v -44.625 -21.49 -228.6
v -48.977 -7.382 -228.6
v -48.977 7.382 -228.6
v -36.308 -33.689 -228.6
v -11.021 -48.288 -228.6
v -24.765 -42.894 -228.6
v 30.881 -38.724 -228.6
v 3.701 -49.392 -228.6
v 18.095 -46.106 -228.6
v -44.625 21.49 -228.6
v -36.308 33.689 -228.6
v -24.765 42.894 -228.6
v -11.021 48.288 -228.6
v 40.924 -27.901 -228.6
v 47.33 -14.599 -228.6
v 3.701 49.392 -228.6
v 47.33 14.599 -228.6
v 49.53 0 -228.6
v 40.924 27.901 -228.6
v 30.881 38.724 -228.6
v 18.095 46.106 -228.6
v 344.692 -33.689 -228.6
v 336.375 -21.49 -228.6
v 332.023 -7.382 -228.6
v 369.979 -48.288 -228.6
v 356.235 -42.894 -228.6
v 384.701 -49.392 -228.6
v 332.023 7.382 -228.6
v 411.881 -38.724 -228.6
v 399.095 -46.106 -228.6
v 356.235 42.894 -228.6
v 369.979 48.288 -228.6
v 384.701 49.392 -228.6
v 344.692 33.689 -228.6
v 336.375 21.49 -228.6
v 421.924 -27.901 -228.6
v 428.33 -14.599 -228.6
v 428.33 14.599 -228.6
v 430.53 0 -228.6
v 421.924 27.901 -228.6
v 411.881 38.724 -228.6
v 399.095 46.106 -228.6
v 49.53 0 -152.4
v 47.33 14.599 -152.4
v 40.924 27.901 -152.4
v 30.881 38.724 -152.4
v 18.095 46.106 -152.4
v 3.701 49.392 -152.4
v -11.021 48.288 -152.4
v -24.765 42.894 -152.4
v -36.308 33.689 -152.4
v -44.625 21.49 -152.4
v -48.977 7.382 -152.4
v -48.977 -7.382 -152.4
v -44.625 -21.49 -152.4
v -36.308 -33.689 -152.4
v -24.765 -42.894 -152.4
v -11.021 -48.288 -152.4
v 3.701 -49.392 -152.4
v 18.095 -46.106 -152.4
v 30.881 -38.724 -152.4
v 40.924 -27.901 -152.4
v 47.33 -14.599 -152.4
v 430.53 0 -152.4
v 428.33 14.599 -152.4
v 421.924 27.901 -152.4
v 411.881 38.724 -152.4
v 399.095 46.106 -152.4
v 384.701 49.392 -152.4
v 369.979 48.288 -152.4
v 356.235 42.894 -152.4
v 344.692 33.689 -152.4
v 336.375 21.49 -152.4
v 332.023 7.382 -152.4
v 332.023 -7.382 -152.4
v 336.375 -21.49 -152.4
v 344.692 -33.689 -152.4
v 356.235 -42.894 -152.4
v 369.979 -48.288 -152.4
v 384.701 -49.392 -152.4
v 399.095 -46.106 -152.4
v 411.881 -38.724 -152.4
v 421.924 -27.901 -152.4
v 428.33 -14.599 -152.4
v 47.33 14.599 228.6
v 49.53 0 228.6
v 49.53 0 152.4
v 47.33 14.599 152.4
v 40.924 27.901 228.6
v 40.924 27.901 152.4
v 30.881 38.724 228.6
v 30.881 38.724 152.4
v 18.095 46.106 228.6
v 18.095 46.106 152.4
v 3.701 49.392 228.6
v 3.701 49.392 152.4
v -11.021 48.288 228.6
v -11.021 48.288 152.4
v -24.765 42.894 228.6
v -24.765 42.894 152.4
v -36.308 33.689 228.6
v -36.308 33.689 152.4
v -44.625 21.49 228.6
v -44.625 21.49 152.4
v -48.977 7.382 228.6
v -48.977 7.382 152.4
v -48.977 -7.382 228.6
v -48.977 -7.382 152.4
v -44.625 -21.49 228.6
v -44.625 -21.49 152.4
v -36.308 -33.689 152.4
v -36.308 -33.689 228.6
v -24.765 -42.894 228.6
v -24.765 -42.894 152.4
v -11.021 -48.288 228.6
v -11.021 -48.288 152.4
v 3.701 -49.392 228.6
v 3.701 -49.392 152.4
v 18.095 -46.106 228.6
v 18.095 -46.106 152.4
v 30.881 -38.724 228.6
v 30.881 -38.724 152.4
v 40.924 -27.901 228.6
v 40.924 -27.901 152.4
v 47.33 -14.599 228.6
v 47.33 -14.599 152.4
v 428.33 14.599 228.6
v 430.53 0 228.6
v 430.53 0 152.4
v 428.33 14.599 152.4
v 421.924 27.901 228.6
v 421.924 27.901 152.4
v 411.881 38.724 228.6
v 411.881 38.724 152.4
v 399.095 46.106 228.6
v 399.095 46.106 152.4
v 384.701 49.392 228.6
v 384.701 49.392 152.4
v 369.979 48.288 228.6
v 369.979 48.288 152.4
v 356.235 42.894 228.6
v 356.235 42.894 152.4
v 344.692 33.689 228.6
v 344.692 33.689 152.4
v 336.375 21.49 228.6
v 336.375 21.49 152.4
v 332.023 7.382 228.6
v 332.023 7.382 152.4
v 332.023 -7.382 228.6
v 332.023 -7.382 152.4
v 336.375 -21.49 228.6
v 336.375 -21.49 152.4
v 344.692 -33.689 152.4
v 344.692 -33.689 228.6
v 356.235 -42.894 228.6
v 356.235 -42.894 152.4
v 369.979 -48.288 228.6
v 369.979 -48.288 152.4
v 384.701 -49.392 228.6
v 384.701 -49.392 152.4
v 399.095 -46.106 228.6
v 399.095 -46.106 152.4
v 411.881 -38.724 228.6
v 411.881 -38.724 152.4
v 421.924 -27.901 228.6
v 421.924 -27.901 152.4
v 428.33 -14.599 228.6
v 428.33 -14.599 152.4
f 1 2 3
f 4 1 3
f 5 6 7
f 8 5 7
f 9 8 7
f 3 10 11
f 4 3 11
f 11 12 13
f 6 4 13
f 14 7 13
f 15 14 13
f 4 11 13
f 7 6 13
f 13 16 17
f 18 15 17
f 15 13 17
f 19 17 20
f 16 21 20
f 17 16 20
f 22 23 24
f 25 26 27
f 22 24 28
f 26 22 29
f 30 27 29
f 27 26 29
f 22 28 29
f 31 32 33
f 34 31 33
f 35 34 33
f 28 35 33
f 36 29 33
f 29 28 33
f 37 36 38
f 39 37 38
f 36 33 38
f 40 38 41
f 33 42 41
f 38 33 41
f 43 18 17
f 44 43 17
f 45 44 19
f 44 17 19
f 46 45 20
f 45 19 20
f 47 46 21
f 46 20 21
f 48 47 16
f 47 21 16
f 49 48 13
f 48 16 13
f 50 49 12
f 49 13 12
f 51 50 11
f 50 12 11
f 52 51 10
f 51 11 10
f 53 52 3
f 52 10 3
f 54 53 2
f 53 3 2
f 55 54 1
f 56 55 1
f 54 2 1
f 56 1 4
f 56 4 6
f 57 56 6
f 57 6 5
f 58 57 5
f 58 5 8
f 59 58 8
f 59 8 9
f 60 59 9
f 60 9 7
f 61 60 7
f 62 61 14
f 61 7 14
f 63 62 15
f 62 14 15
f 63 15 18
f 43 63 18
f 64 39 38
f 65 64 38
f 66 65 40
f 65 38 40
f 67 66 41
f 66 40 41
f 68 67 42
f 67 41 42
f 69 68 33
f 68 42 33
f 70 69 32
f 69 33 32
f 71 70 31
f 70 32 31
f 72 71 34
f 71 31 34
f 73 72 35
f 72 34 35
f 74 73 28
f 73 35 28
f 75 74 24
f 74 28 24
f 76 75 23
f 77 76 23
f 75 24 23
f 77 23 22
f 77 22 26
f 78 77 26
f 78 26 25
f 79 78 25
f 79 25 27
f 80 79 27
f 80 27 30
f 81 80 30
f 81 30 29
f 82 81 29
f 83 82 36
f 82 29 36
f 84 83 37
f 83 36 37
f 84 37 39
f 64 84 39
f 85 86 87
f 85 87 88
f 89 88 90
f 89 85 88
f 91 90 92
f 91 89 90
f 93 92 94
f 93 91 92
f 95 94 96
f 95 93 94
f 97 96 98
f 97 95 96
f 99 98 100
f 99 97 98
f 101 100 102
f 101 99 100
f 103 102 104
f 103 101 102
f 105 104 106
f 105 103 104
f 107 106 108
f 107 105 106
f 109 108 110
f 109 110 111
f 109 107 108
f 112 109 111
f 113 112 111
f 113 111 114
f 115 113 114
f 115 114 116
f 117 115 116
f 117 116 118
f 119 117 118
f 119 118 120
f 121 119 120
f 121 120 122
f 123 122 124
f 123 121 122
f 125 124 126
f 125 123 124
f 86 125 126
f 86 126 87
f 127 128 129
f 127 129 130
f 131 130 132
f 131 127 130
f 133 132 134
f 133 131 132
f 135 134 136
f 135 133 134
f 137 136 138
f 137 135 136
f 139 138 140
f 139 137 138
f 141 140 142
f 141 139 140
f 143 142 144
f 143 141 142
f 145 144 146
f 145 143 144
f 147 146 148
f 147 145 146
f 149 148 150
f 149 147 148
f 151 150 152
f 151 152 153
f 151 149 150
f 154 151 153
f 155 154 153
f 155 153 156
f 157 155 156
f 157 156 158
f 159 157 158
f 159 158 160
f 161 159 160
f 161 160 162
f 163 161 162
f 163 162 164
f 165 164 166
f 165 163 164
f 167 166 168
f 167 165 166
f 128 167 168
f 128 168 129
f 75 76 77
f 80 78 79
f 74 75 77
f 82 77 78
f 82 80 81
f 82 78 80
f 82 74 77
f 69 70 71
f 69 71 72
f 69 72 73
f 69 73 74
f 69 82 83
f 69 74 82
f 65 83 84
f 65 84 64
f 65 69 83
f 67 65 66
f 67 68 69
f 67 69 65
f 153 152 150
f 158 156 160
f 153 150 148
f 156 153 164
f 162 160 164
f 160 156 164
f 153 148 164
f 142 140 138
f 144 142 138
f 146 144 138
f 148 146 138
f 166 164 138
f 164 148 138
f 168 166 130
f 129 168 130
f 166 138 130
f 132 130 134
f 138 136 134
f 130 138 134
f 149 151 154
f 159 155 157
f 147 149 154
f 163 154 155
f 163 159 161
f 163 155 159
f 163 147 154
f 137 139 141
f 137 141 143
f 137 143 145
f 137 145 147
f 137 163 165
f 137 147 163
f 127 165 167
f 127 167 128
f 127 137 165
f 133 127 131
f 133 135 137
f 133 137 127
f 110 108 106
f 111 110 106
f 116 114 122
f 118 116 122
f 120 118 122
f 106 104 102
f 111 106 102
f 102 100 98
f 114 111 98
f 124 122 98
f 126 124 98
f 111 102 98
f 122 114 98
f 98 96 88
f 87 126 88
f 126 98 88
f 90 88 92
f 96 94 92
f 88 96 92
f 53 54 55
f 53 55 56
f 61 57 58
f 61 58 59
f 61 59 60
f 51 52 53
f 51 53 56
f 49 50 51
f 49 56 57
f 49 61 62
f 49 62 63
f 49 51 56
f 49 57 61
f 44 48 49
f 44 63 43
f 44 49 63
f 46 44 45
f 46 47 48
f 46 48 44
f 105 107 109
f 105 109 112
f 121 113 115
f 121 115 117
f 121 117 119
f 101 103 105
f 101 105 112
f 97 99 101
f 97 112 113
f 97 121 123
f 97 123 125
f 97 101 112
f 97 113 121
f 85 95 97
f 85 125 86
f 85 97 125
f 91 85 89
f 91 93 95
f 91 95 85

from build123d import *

# Parameters (mm, degrees)
BOSS_EXTRUDE1_START   = 228.6
SKETCH1_R             = 49.53
BOSS_EXTRUDE1_DEPTH   = 76.2
BOSS_EXTRUDE1_2_DEPTH = 76.2


with BuildPart() as part:
    # Sketch1 → Boss-Extrude1 (new body)
    with BuildSketch(Plane.XY.offset(BOSS_EXTRUDE1_START)):
        Circle(SKETCH1_R)
    extrude(amount=-BOSS_EXTRUDE1_DEPTH)


with BuildPart() as body_2:
    # Sketch1 → Boss-Extrude1 2 (new body)
    with BuildSketch(Plane.XY.offset(BOSS_EXTRUDE1_START)):
        with Locations((381, 0)):
            Circle(SKETCH1_R)
    extrude(amount=-BOSS_EXTRUDE1_2_DEPTH)


with BuildPart() as body_3:
    # Mirror3: mirrored copy
    add(part.part.mirror(Plane.XY))


with BuildPart() as body_4:
    # Mirror3 2: mirrored copy
    add(body_2.part.mirror(Plane.XY))


solid = Compound([part.part, body_2.part, body_3.part, body_4.part])
